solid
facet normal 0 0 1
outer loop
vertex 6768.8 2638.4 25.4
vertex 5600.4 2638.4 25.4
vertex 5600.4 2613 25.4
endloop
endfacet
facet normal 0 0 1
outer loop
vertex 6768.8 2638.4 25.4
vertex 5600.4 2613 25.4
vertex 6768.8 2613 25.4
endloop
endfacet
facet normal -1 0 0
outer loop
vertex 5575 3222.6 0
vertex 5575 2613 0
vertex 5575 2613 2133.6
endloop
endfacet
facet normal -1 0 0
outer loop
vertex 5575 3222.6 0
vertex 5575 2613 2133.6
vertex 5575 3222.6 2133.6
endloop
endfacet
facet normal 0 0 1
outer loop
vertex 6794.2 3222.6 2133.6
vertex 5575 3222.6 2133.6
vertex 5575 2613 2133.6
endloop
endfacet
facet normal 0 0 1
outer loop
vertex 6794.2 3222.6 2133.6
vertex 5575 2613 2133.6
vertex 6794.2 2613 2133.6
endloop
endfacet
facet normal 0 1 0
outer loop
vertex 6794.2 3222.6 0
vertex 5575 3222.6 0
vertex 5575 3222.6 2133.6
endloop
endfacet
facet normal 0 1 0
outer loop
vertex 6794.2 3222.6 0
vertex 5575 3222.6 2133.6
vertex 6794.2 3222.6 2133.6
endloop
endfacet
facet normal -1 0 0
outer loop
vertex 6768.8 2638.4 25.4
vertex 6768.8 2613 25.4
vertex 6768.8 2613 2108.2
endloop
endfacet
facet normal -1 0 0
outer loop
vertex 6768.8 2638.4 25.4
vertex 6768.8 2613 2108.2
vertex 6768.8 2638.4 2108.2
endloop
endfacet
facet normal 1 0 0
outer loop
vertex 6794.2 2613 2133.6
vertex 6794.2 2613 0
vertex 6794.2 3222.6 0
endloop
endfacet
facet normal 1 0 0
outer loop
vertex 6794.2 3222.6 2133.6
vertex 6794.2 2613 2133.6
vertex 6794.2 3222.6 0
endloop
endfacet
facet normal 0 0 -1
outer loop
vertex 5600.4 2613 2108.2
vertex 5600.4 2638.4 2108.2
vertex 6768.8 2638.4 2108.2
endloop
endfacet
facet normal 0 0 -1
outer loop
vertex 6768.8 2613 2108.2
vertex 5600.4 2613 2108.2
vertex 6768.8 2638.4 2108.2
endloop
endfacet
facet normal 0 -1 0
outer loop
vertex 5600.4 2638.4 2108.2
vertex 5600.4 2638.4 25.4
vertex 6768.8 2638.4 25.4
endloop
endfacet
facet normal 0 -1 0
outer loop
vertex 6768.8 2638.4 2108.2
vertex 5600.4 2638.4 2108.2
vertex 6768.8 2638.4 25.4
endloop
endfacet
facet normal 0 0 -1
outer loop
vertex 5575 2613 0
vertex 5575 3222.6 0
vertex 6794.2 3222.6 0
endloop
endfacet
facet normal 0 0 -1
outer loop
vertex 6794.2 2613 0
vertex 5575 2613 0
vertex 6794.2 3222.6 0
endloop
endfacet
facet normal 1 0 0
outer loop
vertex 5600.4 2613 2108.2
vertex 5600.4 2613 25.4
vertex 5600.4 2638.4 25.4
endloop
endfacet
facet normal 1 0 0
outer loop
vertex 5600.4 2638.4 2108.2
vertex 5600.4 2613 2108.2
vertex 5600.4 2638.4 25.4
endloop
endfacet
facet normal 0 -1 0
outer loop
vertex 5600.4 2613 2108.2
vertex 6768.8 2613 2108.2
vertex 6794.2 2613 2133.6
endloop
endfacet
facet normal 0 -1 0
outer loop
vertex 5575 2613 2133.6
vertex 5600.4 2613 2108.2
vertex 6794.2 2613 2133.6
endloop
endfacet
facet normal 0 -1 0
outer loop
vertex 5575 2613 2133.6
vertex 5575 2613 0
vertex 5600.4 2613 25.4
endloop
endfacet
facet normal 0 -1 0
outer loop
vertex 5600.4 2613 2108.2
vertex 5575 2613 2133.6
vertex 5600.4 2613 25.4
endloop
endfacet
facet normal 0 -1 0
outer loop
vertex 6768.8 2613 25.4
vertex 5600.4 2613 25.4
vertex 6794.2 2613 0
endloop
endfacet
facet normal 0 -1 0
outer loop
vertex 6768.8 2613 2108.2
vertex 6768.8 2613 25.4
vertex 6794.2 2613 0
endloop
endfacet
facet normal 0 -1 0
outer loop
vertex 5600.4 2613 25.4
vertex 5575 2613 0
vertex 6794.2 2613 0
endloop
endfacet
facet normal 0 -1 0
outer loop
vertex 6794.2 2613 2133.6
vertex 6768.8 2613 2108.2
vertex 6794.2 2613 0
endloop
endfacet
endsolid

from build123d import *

# Parameters (mm, degrees)
BOX017_W     = 1168.4
BOX017_H     = 25.4
BOX017_DEPTH = 2082.8
BOX016_W     = 1219.2
BOX016_H     = 609.6
BOX016_DEPTH = 2133.6


with BuildPart() as cube017:
    # Box017 → Box017 (new body)
    with BuildSketch(Plane(origin=(25.4, 0, 25.4), x_dir=(1, 0, 0), z_dir=(0, 0, 1))):
        with Locations((584.2, 12.7)):
            Rectangle(BOX017_W, BOX017_H)
    extrude(amount=BOX017_DEPTH)


with BuildPart() as cut005:
    # Box016 → Box016 (new body)
    with BuildSketch(Plane.XY):
        with Locations((609.6, 304.8)):
            Rectangle(BOX016_W, BOX016_H)
    extrude(amount=BOX016_DEPTH)

    # Cut005: cut Cube017
    add(cube017.part, mode=Mode.SUBTRACT)


with BuildPart() as cut005_1:
    # Cut005 placement: moved
    add(cut005.part.moved(Location((5575, 2613, 0))))


solid = cut005_1.part
